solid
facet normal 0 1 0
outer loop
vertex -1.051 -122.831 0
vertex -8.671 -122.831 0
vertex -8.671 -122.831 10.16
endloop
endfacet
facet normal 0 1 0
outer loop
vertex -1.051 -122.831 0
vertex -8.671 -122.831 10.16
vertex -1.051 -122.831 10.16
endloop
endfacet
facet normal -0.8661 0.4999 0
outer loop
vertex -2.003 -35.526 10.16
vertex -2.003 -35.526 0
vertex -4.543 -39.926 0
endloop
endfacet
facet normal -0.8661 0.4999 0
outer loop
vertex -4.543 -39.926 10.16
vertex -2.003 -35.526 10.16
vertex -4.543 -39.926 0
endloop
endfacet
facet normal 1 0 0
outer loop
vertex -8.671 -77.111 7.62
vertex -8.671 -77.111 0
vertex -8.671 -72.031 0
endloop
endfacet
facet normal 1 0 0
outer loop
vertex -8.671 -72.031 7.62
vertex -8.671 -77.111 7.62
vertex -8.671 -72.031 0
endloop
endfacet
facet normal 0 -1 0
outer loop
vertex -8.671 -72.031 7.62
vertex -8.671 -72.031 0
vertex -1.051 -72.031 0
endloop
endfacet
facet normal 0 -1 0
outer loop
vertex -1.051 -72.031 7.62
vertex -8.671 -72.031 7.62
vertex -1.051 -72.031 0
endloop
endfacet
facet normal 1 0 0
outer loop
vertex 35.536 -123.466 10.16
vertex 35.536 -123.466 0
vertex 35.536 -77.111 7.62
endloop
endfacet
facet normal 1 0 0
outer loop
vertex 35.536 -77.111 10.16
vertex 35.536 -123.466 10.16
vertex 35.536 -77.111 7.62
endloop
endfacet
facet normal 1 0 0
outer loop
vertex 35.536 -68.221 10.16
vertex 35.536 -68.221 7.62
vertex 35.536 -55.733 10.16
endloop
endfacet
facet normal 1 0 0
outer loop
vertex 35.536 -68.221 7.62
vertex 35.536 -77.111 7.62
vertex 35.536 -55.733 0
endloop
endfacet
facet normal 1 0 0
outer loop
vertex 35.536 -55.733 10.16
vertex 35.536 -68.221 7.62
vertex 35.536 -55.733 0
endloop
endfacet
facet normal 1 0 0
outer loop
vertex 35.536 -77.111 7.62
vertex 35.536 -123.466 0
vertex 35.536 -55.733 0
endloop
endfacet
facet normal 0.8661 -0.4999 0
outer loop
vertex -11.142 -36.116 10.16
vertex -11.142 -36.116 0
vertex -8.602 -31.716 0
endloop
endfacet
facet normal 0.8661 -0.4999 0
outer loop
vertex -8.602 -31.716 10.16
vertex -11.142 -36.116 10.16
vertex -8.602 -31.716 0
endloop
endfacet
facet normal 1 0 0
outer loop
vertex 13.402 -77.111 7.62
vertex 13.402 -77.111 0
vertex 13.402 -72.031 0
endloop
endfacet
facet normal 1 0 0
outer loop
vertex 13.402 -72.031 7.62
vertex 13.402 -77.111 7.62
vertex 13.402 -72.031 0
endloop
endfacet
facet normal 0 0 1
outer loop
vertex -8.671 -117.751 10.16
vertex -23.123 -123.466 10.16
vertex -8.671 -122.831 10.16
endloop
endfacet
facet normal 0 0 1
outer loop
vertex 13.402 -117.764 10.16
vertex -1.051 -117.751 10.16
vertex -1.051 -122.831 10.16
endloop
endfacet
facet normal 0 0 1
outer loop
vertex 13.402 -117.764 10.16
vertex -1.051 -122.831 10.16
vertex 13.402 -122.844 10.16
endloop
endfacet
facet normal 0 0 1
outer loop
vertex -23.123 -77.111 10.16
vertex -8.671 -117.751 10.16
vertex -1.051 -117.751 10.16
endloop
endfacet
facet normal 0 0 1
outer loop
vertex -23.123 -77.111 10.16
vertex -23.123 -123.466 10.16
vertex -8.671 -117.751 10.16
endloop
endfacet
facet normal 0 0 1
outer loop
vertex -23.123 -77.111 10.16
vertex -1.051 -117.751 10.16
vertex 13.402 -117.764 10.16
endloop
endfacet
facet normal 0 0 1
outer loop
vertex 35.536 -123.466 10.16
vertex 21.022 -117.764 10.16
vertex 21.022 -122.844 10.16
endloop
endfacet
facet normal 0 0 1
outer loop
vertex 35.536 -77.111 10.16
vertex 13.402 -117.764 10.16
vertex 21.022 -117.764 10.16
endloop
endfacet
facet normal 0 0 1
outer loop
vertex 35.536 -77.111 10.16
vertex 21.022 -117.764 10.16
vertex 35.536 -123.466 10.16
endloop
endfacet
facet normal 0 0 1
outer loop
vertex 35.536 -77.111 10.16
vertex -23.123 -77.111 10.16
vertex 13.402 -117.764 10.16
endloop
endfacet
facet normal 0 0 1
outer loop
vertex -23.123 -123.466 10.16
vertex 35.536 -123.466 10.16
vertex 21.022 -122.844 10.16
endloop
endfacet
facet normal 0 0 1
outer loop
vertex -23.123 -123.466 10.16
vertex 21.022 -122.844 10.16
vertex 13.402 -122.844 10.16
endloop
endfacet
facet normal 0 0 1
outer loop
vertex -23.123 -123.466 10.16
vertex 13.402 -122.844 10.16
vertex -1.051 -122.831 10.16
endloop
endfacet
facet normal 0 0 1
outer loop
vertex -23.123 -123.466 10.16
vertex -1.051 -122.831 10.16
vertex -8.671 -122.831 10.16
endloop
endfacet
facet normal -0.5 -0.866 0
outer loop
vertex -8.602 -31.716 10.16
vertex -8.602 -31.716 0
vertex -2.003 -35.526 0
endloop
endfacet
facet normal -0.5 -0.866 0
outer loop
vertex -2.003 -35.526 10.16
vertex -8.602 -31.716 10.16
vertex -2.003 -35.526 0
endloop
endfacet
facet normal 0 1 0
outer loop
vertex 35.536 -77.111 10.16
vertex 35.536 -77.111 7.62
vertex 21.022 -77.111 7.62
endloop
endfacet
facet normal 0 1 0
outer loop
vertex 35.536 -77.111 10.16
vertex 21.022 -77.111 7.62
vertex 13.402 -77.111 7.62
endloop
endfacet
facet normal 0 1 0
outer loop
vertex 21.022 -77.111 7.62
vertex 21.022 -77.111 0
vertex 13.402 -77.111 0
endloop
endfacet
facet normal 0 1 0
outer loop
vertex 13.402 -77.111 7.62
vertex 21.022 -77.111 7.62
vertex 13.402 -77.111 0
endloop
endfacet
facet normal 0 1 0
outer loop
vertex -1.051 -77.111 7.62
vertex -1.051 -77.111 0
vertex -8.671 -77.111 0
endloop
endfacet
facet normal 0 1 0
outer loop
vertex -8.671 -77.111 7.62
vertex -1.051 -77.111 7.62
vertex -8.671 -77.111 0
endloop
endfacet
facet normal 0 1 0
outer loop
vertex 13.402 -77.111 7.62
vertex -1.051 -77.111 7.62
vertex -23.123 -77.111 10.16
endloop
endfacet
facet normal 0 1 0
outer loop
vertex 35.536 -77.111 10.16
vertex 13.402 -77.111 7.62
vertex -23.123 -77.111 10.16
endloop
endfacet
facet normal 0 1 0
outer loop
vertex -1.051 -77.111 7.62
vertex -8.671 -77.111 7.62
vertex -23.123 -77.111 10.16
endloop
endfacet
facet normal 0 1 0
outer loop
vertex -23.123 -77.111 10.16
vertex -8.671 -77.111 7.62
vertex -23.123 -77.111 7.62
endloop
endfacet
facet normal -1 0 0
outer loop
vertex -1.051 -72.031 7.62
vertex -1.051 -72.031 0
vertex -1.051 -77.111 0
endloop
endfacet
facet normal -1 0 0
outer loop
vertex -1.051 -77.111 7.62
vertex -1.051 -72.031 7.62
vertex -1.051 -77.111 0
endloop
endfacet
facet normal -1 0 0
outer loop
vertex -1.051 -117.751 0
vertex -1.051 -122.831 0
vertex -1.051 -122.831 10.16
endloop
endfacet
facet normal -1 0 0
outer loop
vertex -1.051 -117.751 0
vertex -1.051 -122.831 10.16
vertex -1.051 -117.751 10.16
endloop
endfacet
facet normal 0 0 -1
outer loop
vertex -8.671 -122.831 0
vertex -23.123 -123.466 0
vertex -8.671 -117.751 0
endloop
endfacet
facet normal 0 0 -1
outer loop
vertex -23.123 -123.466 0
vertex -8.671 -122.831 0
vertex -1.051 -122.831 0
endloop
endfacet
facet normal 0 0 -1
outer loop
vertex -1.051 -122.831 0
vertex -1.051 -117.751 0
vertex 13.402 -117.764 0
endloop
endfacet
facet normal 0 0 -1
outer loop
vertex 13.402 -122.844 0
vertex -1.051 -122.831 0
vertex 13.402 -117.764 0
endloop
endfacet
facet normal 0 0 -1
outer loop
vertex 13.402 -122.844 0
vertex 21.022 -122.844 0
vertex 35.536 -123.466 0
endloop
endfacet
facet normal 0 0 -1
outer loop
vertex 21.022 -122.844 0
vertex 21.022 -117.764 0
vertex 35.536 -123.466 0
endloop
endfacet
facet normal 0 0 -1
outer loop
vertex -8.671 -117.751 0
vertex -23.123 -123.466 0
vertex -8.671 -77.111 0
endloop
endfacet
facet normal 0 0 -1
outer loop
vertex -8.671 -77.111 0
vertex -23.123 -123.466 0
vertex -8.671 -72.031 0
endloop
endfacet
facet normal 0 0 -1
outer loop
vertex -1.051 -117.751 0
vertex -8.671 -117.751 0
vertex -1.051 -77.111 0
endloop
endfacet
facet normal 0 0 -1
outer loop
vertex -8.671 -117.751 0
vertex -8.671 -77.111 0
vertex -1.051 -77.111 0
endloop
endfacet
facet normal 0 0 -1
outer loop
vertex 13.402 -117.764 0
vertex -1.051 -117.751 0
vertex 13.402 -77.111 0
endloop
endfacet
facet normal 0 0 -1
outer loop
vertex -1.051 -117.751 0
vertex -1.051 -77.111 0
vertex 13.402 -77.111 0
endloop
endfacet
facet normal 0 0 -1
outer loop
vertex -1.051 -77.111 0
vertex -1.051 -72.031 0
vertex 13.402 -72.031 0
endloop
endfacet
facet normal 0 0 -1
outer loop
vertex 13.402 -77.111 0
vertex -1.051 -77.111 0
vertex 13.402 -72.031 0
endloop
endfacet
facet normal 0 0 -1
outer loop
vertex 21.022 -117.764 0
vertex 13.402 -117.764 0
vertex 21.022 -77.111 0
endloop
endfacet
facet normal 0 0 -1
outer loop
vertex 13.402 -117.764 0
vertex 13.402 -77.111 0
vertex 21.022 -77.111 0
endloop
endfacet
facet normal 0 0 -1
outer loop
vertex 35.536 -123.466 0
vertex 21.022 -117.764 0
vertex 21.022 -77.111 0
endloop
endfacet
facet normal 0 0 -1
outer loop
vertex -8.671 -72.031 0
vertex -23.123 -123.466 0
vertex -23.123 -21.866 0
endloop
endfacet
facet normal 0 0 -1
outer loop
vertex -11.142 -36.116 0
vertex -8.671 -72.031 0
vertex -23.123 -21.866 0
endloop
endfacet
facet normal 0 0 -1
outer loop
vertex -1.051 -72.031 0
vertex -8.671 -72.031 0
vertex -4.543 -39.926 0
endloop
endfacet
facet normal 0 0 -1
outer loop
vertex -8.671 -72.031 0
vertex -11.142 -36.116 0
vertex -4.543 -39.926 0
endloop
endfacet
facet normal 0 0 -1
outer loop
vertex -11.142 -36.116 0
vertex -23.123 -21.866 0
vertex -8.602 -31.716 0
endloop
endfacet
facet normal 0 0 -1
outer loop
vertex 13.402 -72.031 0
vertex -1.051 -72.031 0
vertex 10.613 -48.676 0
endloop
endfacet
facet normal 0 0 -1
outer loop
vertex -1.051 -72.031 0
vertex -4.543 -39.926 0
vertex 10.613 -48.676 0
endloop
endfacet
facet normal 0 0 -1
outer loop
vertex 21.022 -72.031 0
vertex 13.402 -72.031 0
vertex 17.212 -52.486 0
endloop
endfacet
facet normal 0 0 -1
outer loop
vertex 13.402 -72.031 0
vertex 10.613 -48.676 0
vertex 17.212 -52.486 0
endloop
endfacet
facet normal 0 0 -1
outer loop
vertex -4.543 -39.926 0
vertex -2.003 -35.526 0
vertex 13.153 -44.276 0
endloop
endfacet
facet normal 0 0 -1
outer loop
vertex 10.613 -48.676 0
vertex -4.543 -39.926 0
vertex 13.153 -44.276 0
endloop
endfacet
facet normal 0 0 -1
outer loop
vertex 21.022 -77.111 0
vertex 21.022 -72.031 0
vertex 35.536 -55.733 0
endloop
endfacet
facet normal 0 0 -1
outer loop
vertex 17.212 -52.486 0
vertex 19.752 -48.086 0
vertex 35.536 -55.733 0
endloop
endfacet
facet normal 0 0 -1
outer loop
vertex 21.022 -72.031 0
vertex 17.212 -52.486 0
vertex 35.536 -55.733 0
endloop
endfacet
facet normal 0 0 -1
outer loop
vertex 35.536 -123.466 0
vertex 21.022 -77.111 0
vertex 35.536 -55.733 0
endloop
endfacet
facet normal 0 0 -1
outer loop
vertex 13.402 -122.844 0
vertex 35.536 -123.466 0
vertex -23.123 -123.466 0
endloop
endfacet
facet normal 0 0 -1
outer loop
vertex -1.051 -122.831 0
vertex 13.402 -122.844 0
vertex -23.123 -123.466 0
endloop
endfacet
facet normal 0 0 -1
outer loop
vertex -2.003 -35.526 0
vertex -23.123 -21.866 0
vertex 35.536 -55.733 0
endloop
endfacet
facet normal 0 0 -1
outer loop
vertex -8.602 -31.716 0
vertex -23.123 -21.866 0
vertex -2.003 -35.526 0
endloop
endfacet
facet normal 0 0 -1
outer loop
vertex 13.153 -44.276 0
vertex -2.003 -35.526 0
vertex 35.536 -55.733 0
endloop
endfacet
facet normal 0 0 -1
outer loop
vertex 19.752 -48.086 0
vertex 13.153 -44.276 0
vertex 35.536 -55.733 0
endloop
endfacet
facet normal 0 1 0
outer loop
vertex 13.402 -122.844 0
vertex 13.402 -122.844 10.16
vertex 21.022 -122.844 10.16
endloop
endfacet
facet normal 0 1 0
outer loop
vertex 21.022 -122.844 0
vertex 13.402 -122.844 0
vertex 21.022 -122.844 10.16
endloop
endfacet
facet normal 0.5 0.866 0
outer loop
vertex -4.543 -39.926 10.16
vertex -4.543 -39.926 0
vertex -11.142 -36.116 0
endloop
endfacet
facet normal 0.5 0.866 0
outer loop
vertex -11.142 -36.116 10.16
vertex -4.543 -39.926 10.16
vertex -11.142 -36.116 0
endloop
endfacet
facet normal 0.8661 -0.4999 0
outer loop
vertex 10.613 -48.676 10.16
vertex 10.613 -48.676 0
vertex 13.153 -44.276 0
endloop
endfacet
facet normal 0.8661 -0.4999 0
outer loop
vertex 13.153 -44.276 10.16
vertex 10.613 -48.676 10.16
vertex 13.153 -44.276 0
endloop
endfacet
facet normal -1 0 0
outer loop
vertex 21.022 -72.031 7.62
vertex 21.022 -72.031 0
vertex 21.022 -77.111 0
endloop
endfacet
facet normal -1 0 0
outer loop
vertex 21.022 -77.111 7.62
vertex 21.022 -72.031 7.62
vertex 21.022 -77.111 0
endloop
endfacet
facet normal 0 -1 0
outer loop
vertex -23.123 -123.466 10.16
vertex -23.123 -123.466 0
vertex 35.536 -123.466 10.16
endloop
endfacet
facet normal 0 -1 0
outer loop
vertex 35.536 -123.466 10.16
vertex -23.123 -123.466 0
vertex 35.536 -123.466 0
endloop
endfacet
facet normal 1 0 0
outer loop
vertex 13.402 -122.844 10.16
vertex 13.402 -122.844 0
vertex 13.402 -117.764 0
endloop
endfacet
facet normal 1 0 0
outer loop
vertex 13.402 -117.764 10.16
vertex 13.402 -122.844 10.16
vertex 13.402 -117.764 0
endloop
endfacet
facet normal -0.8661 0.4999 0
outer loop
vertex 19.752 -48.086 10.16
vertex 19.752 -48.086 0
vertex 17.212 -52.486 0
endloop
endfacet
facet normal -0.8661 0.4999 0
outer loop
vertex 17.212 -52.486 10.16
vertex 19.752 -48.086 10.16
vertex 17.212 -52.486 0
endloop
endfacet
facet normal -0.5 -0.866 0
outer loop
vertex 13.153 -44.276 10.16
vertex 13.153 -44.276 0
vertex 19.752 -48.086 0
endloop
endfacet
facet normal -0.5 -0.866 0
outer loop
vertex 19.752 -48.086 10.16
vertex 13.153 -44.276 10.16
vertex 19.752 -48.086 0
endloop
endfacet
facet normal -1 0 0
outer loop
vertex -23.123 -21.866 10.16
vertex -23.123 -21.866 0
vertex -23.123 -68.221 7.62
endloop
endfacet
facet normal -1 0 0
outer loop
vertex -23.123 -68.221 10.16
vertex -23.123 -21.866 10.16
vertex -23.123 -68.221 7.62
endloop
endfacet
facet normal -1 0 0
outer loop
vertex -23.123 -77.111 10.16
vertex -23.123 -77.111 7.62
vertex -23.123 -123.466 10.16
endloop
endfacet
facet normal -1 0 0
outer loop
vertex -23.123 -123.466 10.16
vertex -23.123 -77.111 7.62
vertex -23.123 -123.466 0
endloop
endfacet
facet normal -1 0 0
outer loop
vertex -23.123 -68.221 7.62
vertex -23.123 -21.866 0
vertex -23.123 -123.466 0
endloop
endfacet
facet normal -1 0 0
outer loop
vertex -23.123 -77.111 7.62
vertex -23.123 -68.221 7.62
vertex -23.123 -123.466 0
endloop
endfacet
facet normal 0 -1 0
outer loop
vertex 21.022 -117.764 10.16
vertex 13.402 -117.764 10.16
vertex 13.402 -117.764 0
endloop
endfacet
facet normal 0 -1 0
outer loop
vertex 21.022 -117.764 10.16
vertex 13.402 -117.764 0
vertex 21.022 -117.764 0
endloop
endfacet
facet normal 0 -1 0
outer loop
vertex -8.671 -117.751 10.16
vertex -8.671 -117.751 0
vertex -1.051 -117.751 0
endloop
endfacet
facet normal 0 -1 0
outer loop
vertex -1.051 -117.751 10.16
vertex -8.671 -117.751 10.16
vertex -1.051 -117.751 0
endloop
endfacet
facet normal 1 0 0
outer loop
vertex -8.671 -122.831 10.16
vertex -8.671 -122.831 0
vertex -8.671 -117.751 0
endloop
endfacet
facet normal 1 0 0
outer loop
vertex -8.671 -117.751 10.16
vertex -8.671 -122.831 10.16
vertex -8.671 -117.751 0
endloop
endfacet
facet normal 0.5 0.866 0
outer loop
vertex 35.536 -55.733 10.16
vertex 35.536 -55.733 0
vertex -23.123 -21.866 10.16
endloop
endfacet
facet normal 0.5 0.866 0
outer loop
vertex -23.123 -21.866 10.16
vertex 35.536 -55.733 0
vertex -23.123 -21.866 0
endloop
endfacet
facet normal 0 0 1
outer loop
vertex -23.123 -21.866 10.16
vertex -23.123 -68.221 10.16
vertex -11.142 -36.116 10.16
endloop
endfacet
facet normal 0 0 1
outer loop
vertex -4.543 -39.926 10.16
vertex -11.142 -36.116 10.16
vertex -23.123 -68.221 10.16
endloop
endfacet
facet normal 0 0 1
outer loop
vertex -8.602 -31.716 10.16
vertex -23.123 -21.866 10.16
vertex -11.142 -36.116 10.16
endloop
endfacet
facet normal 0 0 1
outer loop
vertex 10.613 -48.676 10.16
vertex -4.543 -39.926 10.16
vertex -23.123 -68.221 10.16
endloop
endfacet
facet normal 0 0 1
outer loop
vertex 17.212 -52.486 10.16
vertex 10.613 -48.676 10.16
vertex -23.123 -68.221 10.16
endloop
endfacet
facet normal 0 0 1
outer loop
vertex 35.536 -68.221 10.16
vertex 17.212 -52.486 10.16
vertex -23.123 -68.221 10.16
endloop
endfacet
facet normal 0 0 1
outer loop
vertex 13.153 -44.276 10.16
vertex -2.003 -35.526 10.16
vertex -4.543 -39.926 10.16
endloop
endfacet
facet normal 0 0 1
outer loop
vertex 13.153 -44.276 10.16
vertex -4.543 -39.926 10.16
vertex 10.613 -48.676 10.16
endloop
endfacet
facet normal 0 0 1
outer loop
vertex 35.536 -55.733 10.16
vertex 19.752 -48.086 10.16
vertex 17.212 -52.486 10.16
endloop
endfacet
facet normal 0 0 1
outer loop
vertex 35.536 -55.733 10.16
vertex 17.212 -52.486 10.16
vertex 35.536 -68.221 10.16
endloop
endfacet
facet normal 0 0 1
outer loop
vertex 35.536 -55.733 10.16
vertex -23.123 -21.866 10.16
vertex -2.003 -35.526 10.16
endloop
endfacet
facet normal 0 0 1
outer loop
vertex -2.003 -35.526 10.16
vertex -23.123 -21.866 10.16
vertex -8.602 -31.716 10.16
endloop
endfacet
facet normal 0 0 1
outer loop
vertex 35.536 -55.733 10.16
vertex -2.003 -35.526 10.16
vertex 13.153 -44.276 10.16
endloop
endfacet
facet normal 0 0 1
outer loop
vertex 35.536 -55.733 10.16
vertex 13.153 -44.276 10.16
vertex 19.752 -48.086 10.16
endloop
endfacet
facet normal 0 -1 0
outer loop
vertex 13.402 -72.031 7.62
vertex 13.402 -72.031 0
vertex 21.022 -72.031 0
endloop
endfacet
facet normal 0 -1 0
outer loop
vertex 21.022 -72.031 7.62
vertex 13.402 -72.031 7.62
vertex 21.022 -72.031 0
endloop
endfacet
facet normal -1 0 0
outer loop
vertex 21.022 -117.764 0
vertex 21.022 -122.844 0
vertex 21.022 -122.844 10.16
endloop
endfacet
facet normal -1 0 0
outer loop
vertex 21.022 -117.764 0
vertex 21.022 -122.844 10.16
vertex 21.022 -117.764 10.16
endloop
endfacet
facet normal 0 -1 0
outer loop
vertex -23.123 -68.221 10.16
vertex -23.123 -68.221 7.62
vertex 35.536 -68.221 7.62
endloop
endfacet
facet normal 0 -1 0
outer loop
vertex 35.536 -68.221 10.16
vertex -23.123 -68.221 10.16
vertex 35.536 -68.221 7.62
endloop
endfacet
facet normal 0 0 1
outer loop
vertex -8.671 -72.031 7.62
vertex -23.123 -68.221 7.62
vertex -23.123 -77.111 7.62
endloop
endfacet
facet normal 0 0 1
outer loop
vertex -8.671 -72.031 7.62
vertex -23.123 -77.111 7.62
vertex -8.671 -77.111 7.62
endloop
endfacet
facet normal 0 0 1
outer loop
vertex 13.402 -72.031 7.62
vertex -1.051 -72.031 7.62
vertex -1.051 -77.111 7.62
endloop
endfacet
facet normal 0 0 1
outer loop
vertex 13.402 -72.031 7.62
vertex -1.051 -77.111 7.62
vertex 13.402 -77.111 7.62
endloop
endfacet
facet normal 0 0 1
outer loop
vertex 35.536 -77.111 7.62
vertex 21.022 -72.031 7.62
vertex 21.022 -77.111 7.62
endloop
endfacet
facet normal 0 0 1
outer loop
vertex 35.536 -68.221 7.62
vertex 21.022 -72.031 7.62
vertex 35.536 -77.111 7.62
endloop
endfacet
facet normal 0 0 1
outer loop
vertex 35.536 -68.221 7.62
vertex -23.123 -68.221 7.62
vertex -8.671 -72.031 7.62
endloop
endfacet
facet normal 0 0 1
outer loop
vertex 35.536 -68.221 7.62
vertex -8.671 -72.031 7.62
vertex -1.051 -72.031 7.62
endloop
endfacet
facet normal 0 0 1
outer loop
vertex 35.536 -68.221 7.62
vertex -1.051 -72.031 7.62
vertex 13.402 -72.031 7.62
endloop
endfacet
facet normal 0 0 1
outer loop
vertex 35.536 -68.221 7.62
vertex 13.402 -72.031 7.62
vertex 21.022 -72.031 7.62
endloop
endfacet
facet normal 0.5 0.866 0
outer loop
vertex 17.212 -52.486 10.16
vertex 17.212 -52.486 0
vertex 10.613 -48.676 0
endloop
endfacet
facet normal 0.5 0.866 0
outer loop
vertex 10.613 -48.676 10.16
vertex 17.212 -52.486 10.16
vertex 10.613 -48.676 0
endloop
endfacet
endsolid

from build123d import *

# Parameters (mm, degrees)
F1_DEPTH = 10.16
F2_DEPTH = 7.62
F0_W     = 7.62
F0_H     = 5.08
F3_DEPTH = 10.16


with BuildPart() as f1:
    # F0 (on Top) → F1 (new body)
    with BuildSketch(Plane.XY):
        Polygon((35.535632, -55.732704), (-23.123154, -21.866039), (-23.123154, -68.221039), (35.535632, -68.221039), align=None)
        Polygon((-11.14219, -36.1156), (-8.60219, -31.716191), (-2.003076, -35.526191), (-4.543076, -39.9256), align=None, mode=Mode.SUBTRACT)
        Polygon((17.212002, -52.4859), (10.612888, -48.6759), (13.152888, -44.276491), (19.752002, -48.086491), align=None, mode=Mode.SUBTRACT)
    extrude(amount=F1_DEPTH)

    # F0 (on Top) → F2 (join)
    with BuildSketch(Plane.XY):
        Polygon((35.535632, -68.221039), (-23.123154, -68.221039), (-23.123154, -77.111039), (-8.670554, -77.111039), (-8.670554, -72.031039), (-1.050554, -72.031039), (-1.050554, -77.111039), (13.402046, -77.111039), (13.402046, -72.031039), (21.022046, -72.031039), (21.022046, -77.111039), (35.535632, -77.111039), align=None)
    extrude(amount=F2_DEPTH)

    # F0 (on Top) → F3 (join)
    with BuildSketch(Plane.XY):
        Polygon((-8.670554, -77.111039), (-23.123154, -77.111039), (-23.123154, -123.466039), (8.804092, -123.466039), (25.314092, -123.466039), (35.535632, -123.466039), (35.535632, -77.111039), (21.022046, -77.111039), (13.402046, -77.111039), (-1.050554, -77.111039), align=None)
        with Locations((-4.860554, -120.291039)):
            Rectangle(F0_W, F0_H, mode=Mode.SUBTRACT)
        with Locations((17.212046, -120.304264)):
            Rectangle(F0_W, F0_H, mode=Mode.SUBTRACT)
    extrude(amount=F3_DEPTH)


solid = f1.part
